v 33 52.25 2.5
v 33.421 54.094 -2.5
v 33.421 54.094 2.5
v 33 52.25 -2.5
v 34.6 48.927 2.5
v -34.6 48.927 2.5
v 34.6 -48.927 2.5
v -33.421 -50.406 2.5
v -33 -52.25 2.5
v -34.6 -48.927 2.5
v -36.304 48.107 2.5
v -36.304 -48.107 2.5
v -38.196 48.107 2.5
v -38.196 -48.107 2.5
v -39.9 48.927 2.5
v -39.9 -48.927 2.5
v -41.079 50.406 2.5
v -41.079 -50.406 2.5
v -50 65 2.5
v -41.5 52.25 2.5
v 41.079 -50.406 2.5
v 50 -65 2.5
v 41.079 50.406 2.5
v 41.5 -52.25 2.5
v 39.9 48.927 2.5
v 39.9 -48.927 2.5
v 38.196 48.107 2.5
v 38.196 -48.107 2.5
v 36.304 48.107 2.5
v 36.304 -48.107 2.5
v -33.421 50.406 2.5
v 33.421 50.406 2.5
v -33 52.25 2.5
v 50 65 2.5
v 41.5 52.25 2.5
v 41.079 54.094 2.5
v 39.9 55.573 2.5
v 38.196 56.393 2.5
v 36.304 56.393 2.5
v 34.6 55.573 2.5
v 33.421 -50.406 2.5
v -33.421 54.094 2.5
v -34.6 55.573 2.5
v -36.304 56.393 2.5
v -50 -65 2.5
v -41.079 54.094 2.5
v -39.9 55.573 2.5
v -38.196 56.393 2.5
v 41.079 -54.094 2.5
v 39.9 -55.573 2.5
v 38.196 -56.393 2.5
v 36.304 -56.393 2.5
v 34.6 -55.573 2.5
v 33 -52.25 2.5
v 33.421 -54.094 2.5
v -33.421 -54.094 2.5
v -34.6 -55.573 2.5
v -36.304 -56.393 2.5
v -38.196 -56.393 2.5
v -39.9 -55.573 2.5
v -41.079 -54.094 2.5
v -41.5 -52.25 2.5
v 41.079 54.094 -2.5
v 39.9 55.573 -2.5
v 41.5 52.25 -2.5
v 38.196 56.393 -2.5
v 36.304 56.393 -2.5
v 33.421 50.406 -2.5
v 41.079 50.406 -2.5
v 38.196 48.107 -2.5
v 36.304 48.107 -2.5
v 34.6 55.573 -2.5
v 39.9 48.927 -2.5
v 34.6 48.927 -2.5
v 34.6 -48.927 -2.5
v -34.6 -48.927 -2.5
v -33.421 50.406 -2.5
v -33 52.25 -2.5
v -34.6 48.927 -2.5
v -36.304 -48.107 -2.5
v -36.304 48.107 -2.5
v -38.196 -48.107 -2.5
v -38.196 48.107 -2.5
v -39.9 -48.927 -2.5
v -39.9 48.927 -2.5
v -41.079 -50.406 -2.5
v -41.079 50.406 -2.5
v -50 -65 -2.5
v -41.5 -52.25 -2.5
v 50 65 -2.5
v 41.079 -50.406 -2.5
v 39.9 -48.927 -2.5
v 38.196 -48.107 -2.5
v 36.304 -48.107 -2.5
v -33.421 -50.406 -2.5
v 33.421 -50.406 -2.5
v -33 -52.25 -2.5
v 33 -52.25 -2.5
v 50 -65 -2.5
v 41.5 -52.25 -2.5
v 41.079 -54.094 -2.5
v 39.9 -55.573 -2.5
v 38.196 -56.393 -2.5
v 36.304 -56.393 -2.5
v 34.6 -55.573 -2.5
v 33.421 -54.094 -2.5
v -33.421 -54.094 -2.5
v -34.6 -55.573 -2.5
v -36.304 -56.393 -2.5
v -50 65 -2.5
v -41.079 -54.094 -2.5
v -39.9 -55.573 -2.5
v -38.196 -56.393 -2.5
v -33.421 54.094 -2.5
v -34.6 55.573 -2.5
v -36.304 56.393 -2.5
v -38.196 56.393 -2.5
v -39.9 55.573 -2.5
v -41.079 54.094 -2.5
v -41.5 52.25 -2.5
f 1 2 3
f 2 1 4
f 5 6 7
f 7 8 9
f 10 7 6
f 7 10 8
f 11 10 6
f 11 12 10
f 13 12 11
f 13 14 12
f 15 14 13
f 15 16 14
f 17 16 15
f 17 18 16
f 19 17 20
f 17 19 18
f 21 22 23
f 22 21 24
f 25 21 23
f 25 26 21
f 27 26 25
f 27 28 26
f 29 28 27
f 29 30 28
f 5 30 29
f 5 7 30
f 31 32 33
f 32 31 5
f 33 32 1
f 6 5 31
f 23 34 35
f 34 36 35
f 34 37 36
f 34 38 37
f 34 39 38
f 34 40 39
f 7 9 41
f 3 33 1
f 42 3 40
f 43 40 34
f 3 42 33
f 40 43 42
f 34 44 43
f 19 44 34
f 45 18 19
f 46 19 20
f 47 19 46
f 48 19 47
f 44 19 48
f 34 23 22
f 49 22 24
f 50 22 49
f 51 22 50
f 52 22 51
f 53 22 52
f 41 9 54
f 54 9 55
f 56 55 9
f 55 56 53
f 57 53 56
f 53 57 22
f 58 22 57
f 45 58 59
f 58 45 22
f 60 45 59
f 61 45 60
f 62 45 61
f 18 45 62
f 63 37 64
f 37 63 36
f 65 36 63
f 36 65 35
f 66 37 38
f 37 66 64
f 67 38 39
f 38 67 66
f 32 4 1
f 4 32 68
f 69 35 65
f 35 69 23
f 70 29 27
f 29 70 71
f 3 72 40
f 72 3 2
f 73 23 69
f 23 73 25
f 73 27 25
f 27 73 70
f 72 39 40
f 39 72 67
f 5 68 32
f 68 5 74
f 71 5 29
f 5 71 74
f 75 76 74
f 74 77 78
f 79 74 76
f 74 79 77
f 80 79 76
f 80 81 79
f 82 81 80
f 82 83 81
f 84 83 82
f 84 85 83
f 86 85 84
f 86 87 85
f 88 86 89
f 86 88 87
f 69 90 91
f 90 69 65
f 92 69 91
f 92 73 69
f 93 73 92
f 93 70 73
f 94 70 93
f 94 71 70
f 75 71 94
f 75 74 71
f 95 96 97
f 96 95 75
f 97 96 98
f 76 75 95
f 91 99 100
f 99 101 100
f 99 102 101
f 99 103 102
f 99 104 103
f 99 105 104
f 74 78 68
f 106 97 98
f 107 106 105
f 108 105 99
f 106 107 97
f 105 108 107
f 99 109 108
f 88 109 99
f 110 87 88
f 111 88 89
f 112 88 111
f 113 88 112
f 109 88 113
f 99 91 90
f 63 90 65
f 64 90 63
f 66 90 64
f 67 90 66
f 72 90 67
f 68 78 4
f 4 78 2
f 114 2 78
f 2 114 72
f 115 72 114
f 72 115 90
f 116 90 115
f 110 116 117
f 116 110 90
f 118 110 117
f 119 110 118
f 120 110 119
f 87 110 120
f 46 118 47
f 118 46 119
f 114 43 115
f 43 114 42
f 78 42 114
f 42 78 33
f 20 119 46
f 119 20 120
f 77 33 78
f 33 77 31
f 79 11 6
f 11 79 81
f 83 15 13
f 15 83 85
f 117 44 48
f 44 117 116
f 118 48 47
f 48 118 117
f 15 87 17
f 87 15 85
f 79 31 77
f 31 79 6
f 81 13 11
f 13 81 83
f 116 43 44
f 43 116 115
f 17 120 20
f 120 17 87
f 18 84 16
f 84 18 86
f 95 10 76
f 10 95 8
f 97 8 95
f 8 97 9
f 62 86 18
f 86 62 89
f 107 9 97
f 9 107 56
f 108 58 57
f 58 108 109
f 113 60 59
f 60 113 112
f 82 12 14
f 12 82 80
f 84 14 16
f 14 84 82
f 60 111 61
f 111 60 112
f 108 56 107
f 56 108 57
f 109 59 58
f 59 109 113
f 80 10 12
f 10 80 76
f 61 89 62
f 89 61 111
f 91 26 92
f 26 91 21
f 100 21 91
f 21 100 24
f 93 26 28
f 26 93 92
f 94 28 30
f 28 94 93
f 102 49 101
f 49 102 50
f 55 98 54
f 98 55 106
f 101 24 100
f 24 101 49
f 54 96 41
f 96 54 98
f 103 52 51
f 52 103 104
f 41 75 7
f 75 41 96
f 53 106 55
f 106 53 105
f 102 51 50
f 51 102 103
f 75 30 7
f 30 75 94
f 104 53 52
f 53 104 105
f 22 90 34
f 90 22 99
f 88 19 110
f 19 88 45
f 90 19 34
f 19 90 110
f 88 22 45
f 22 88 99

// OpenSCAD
// Generated by SolidPython 1.1.3 on 2023-10-16 18:04:48


difference() {
	cube(center = true, size = [100, 130.0000000000, 5]);
	union() {
		translate(v = [37.2500000000, 52.2500000000]) {
			cylinder(center = true, h = 5, r = 4.2500000000);
		}
		translate(v = [-37.2500000000, 52.2500000000]) {
			cylinder(center = true, h = 5, r = 4.2500000000);
		}
		translate(v = [-37.2500000000, -52.2500000000]) {
			cylinder(center = true, h = 5, r = 4.2500000000);
		}
		translate(v = [37.2500000000, -52.2500000000]) {
			cylinder(center = true, h = 5, r = 4.2500000000);
		}
	}
}
/***********************************************
*********      SolidPython code:      **********
************************************************
 
import solid
import numbers
import pudb
from solid.utils import *
import viewscad
import subprocess
import os
import os.path as osp
import math
import sys

chamfer_extrude=solid.import_scad("./chamfer_extrude.scad")
chamfer_extrude=chamfer_extrude.chamfer_extrude
r = viewscad.Renderer(width=800, height=800)

def debug(model,f_name,path="/home/ts/code/projects/mfd/designs/debug"):
    solid.scad_render_to_file(model,osp.join(path,f_name)+".scad")
#generate position list of wells using offset from center
wells_pos_from_center_4 = lambda offset: [[-offset,offset],
                                        [offset, offset],
                                        [-offset, -offset],
                                        [offset, -offset]]
#wells_pos_from_center_2 = lambda offset: [[0,offset],
#                                        [0, -offset]]
wells_pos_from_center_2 = lambda offset: [[offset,0],
                                        [-offset,0]]

def make_well(dims,shape=None,height=None,dxf=False):
    def circle_cylinder():
        if dxf or (height is None):
            well = solid.circle(r=dims, segments=64)
        else:
            well = solid.cylinder(r=dims, h=height, segments=64, center = True)
        return well
    if dims is None:
        sys.exit("radius needs to be a number")
    if isinstance(dims, numbers.Number):
        well =circle_cylinder()
    elif len(dims)==1:
        if isinstance(dims[1], numbers.Number):
            well =circle_cylinder()
        else:
            sys.exit("radius needs to be a number")
    elif len(dims)==2:
        well = solid.square(dims,center = True)
    elif len(dims)==3:
        well = solid.cube(dims, center = True)
    return well

def wells_top_bottom(center_gap,device_dims=None,shape=None,height=None, positions = None, dxf = False,well_shape=None):
    if well_shape == None:
        well_shape = make_well(device_dims,shape=shape,height=height,dxf=dxf)
    wells = []
    if positions is None:
        offset = radius+radius/2.0
        positions = wells_pos_from_center_2(offset)
    if dxf or (height is None):
        height = 0
    for position in positions:
        if dxf:
            wells.append(solid.translate([position[0],position[1]])(well_shape))
        else:
            wells.append(solid.translate([position[0],position[1],height/2.0])(well_shape))
    return  union()(*wells)

#place wells in four corners 
def four_corner(radius,height=None, positions = None, dxf = False):
    #if well pos not specified set
    #to equally spaced by half radius
    if positions is None:
        offset = radius+radius/2.0
        positions = wells_pos_from_center_4(offset)
    if dxf or (height is None):
        height = 0
    #make wells at positions with specified radius and height
    wells = []
    for position in positions:
        #make circle if making dxf
        if dxf:
            well_shape = solid.circle(r=radius, segments=64)
            well_shape = solid.translate([position[0],position[1]])(well_shape)
        #if stl make cylinder
        else:
            well_shape = solid.cylinder(r=radius, h=height, segments=64, center = True)
            well_shape = solid.translate([position[0],position[1],height/2.0])(well_shape)
        wells.append(well_shape)
    return  union()(*wells)

#generate channels 
def make_channels(length,width,height=0,num_chans=1,max_chans=None,spacing=None, dxf = False,
                  rotate_channels=False):
    if dxf or (height is None):
        height = 0
    #if channel gap not defined, is equal to
    if spacing is None: spacing = width
    #calculate number of channels if fitting max num within given width
    if not max_chans is None:
        import math
        num_chans = math.floor((max_chans-spacing)/(width+spacing))
    #get total width of channel section  
    total_width = (width*num_chans)+(spacing*(num_chans-1))

    #make template channel
    #if rotate_channels: width, length = length, width
    if dxf:
        channel_t = solid.square([length,width],center = True)
    else:
        channel_t = solid.cube([length,width,height], center = True)

    #if number channels is even, offset the first channel to center its gap
    if num_chans % 2 == 0: centering = -(width/2.0+spacing/2.0)
    else: centering = 0
    #move template channel up to align bottom at z = 0 
    #and offset center if necessary
    if dxf:
        channel_t = solid.translate([0,centering])(channel_t)
    else:
        channel_t = solid.translate([0,centering,height/2.0])(channel_t)

    #if rotate_channels: length,width = width,length
    #start making the channels
    channels = []
    for i in range(num_chans):
        #if i=0 there is no translation
        #if i=1, we make the first channel adjacent to second
        direction = i

        #if i>=1, we add channels alternating left and right
        if i >= 1:
            direction = -(i/2.0)
            if i % 2 == 1: direction = (-direction)+0.5
                
        #make channel at right position and add it to channel list
        translation_coords = [0,direction*(width+spacing)]
        #if rotate_channels: translation_coords = [direction*(width+spacing),0]
        if dxf:
            channel = solid.translate(translation_coords)(channel_t)
        else:
            channel = solid.translate([*translation_coords,0])(channel_t)
        channels.append(channel)
    
    #group all channels as one object
    channels = union()(*channels)
    #compute the x,y,z dimensions in order to pass as arguments 
    #for construction of other parts of device (such as the chambers)
    measurements = {'x':(length/2.0,-length/2.0),
                    'y':(total_width/2.0,-total_width/2.0)}
    if not dxf:
        measurements['z'] = (height,0)
    if rotate_channels:
        channels = solid.rotate(90)(channels)
        measurements['x'],measurements['y']=measurements['y'],measurements['x']
    return channels,measurements

def make_chambers(msrs,height=None,extra=0,len_until=None,width=None, dxf = False):
    #computes x,y,z length
    total = lambda x : abs(x[0]) + abs(x[1])
    
    #if specific height if specified
    #otherwise use same height as channels
    if dxf:
        pass
    elif not height is None:
        msrs['z'] = (height,0)
    else:
        msrs['z'] = (0,0)
        
    #make copy of measurements from channels to modify chamber dimensions 
    #and add length to chambers as specified
    chamber_dims = msrs.copy()
    #calculate length of chamber to reach specified offset
    if not len_until is None:
        chamber_len = len_until-(msrs['x'][0])
    #or add specified length to channel length (if not specified, adds 0)
    else:
        chamber_len = msrs['x'][0]+extra
    #set the chamber length based 
    chamber_dims['x'] = (chamber_len/2.0,-(chamber_len/2.0))
    #compute final dimensions of chamber
    if not width is None:
        chamber_dims['y'] = (width/2.0,-width/2.0)
    chamber_dims = [total(size) for size in chamber_dims.values()]
        
    #calculate chamber translation offset to place adjacent to channels
    chamber_trslt = msrs['x'][0]+(chamber_len/2.0)
    #compute chamber translation coordinates to align with channels
    #x = 1 moves chamber above channels
    #x = -1 moves chamber below channels
    if dxf:
        trslt = lambda x : [x*(chamber_trslt),0]
    else:
        trslt = lambda x : [x*(chamber_trslt),0,msrs['z'][0]/2.0]
    
    #function to make chamber at top or at bottom 
    if dxf:
        move = lambda x : solid.translate(trslt(x))(solid.square(chamber_dims, center = True) )
    else:
        move = lambda x : solid.translate(trslt(x))(solid.cube(chamber_dims,center = True))
    #make top and bottom chambers and return them as grouped
    top = move(1)
    bottom = move(-1)
    #chambers=solid.rotate(90)(solid.union()(top,bottom))
    chambers=(solid.union()(top,bottom))

    return chambers

#create alignment features 
def alignment_features(unit,dims,grid_size, mask_size = None, alignment = "hollow", units_from_center = (2.5,2.5), corner_len=None):
    width = grid_size[0]*dims[0]
    length = grid_size[1]*dims[1]
    if mask_size is None and corner_len is None:
        corner_len = (dims[0] + dims[1]) /2 / 8
    corner = lambda thickness_div : solid.union()( solid.square([corner_len,corner_len/thickness_div],center=False), solid.square([corner_len/thickness_div,corner_len],center=False) )
    
    def make_full(thickness_div):
        thickness = corner_len/thickness_div
        tr = solid.translate([0, 0, 0 ])(solid.rotate(180)(corner(thickness_div)))
        tr = solid.translate([thickness/2,thickness/2,0])(tr)
        bl = solid.translate([0, 0, 0 ])(solid.rotate(0)(corner(thickness_div)))
        bl = solid.translate([-thickness/2,-thickness/2,0])(bl)
        return solid.union()(tr,bl)
    
    def make_hollow(thickness_div):
        thickness = corner_len/(thickness_div/2)
        inner = make_full(thickness_div)
        outer = make_full(thickness_div/2)
        hollow = outer - inner 
        return hollow
    
    center = (width /2 , length/2)
    mask_pos = lambda x,y : (center[0] + x*(float(units_from_center[0])*dims[0]), center[1] + y*(float(units_from_center[1])*dims[1]))
    positions = []
    positions.append(mask_pos(1,0))
    positions.append(mask_pos(0,1))
    positions.append(mask_pos(-1,0))
    positions.append(mask_pos(0,-1))
    make_mask = lambda mtype : make_hollow(8) if mtype == "hollow" else make_full(8)
    masks = [ solid.translate([*position,0])(make_mask(alignment)) for position in positions]
    
    solid.scad_render_to_file(solid.union()(*masks),"./designs/open_chamber/masks.scad")
    #return unit - solid.union()(*masks)
    return solid.union()(*masks,unit)

def create_outline(thickness, array, dims, grid_size,):
    width = grid_size[0]*dims[0] + thickness *2
    length = grid_size[1]*dims[1] + thickness *2
    outer = solid.translate([-thickness, -thickness,0])(solid.square([width, length]))
    return outer-array

def create_wall(wall_thickness, outline_thickness, dims, grid_size, wall_height = 2000, dxf = False):
    inner_width = grid_size[0]*dims[0] + outline_thickness *2
    inner_length = grid_size[1]*dims[1] + outline_thickness *2
    outer_width = inner_width + wall_thickness * 2
    outer_length = inner_length + wall_thickness * 2
    outer_pos_x = -outline_thickness-wall_thickness
    outer_pos_y = -outline_thickness-wall_thickness
    inner_pos_x = -outline_thickness
    inner_pos_y = -outline_thickness
    if dxf:
        inner_wall = solid.translate([inner_pos_x,
                                      inner_pos_y,
                                      0])(solid.square([inner_width, inner_length]))
        outer_wall = solid.translate([outer_pos_x,
                                      outer_pos_y,
                                      0])(solid.square([outer_width, outer_length]))

        return outer_wall-inner_wall
    else:
        inner_wall = solid.translate([inner_pos_x,
                                      inner_pos_y,
                                      0])(solid.cube([inner_width, inner_length,wall_height]))
        outer_wall = solid.translate([outer_pos_x,
                                      outer_pos_y,
                                      0])(solid.cube([outer_width, outer_length,wall_height]))

        return outer_wall-inner_wall, {'wall_height': wall_height,
                                       'wall_thickness': wall_thickness,
                                       'inner_width':inner_width,
                                       'inner_length': inner_length,
                                       'outer_width': outer_width,
                                       'outer_length': outer_length,
                                       'outer_pos_x' : outer_pos_x,
                                       'outer_pos_y' : outer_pos_y,
                                       'inner_pos_x' : inner_pos_x,
                                       'inner_pos_y' : inner_pos_y}

def create_thicker_wall(wall_thickness, outer_wall_offset, wall_dims, dims, grid_size, height_start = .2, height_end=2, dxf = False):
    addon_wall,thicker_wall_dims = create_wall(wall_thickness, outer_wall_offset, dims, grid_size, wall_height=height_end-height_start, dxf = False)
    addon_wall = solid.translate([0,0,height_start])(addon_wall)

    thicker_wall_dims['wall_height'] = height_end
    thicker_wall_dims['wall_thickness'] = wall_dims['wall_thickness'] + wall_thickness
    return addon_wall, thicker_wall_dims
 
def add_lock_to_wall(wall,wall_dims,y_offset = 0,cut_ratio=0.7,L_length=3, gap_ratio=0.05, axis="x",width_ratio=1/2):
    # Makes L shape
    def make_L(max_length,length_thickness,max_width,width_thickness,height,y_offset):
        length = solid.cube([max_length,length_thickness,height])
        width = solid.cube([width_thickness,max_width,height])
        width = solid.translate([max_length-(width_thickness),0,0])(width)
        L = solid.union()(width,length)
        debug(L,"L")
        if axis == "x":
            L = solid.rotate(-90)(L)
            L = solid.translate([0,max_length,0])(L)
        else:
            L = solid.rotate(-180)(L)
            L = solid.translate([max_length,max_width,0])(L)
        return solid.translate([0,0,y_offset])(L)
    
    lock_length = L_length
    lock_width = wall_dims['wall_thickness']*width_ratio
    lock_length_thickness = lock_width/2
    lock_width_thickness = lock_width/2
    L_lock = make_L(lock_length,lock_length_thickness,lock_width,lock_width_thickness, wall_dims['wall_height']-y_offset, y_offset)
    
    margin_space = lock_length - lock_length*(1-gap_ratio)
    key_length = lock_length-margin_space
    key_length_thickness = lock_length_thickness-(margin_space*2)
    key_width = lock_width-(margin_space*2)
    key_width_thickness = lock_width_thickness-(margin_space*2)
    L_key = make_L(key_length,key_length_thickness,key_width,key_width_thickness, wall_dims['wall_height']-y_offset, y_offset)
    L_key = solid.translate([margin_space,margin_space,0])(L_key)
    L = solid.union()(L_lock,L_key)
    debug(L,"L")
    
    #Make cube to be used as negative to split frame in a half
    #Can choose if making left or right negative, specify ratio of split
    def make_negative(right,cut_ratio):
        if axis == "x":
            if right:
                length = wall_dims['outer_length']*(1-cut_ratio)
                pos_x = wall_dims['outer_pos_x']+(wall_dims['outer_length']*cut_ratio)
            else:
                length = wall_dims['outer_length']*(cut_ratio)
                pos_x = wall_dims['outer_pos_x'] 
            negative = solid.cube([wall_dims['outer_width'],length, wall_dims['wall_height']])
            negative = solid.translate([wall_dims['outer_pos_y'],pos_x,0])(negative)
        else:
            if right:
                length = wall_dims['outer_width']*(1-cut_ratio)
                pos_x = wall_dims['outer_pos_y']+(wall_dims['outer_width']*cut_ratio)
            else:
                length = wall_dims['outer_width']*(cut_ratio)
                pos_x = wall_dims['outer_pos_y'] 
            negative = solid.cube([length,wall_dims['outer_length'], wall_dims['wall_height']])
            negative = solid.translate([pos_x,wall_dims['outer_pos_x'],0])(negative)
        return negative, pos_x, length 
                      
    #Make negatives
    negative_right, right_half_pos_x, right_half_length = make_negative(True,cut_ratio)
    negative_left, left_half_pos_x, right_half_length = make_negative(False,cut_ratio)
    #Make halves
    left_half = solid.difference()(wall,negative_right)
    right_half = solid.difference()(wall,negative_left)
    def place_L(L, L_length,L_width):
        #Place L on top wall       
        offset_to_center = (wall_dims['wall_thickness']-L_width)/2
        if axis == "x":
            y_pos_top = (wall_dims['outer_pos_y'] +
                    wall_dims['outer_width'] - 
                    L_width - offset_to_center)
            top_L = solid.translate([y_pos_top,
                                     right_half_pos_x-(L_length),
                                     0])(L)
            #Place L on bottom wall       
            y_pos_bottom = wall_dims['outer_pos_y']+offset_to_center
            bottom_L = solid.translate([y_pos_bottom,
                                        right_half_pos_x-L_length,
                                        0])(L)
        else:
            y_pos_top = (wall_dims['outer_pos_x'] +
                    wall_dims['outer_length'] -
                    (L_width+offset_to_center))
            top_L = solid.translate([right_half_pos_x-L_length,
                                     y_pos_top,
                                     0])(L)
            #Place L on bottom wall       
            y_pos_bottom = wall_dims['outer_pos_y']+offset_to_center
            bottom_L = solid.translate([right_half_pos_x-L_length,
                                        y_pos_bottom,
                                        0])(L)
        return bottom_L, top_L
    #Make complimentary L pieces through union and differences
    #Make Lock
    bottom_L_lock, top_L_lock = place_L(L_lock,L_length,lock_width)
    left_half = solid.difference()(left_half,bottom_L_lock)
    left_half = solid.difference()(left_half,top_L_lock)
    #Make Key
    bottom_L_key, top_L_key = place_L(L_key,L_length,lock_width)
    right_half = solid.union()(right_half,bottom_L_key)
    right_half = solid.union()(right_half,top_L_key)
    return left_half, right_half


#build a row x col grid of containment units
def make_unit_array(unit,dims,grid_size, dxf = False, alignment = None, mask_size = None,
                    units_from_center = None,alignment_offset=None, alignment_mark_size=1):
    units = []
    for col in range(grid_size[1]):
        for row in range(grid_size[0]):
            if dxf:
                units.append(solid.translate([row*dims[0],col*dims[1]])(unit))
            else:
                units.append(solid.translate([row*dims[0],col*dims[1],dims[2]/2.0])(unit))
    array = solid.union()(*units)
    if (not alignment is None) and dxf:
        if not alignment_offset is None:
            array = solid.translate([alignment_offset[0],alignment_offset[1]])(array)
        array = alignment_features(array,dims, grid_size, alignment = alignment, mask_size = None, units_from_center = units_from_center,corner_len=alignment_mark_size)
        if not alignment_offset is None:
            array = solid.translate([-alignment_offset[0],-alignment_offset[1]])(array)
    return array


def make_taylor(wells_pos = wells_pos_from_center_4(2.25), well_rad = 1.5 ,
                well_height = 2, chan_w = 0.01, chan_l = 1, chan_h = 0.010 ,
                chan_gap = 0.040, max_chans = None,num_chans=100, chamber_height  = 0.100,
                columns = 1, rows = 1, chamber_len_until=2.25, add_channels = True, add_wells = True, 
                add_chambers = True, save_path = "./", alignment = None, units_from_center = 2,
                mask_size = None, render_stl = False, outline_thickness = 0.050, dxf = True,
                wall_height = 15, wall_thickness = 0.95, casing_x=9, casing_y=9, casing_z=0,rotate_units=0):

    dims = [casing_x, casing_y, casing_z]
    wells = four_corner(well_rad,well_height, dxf = dxf, positions = wells_pos)
    debug(wells,"wells")
    channels, msrs = make_channels(chan_l,chan_w,chan_h,dxf=dxf, spacing = chan_gap, max_chans=max_chans,num_chans=num_chans)
    debug(channels,"channels")
    chambers = make_chambers(msrs,dxf = dxf, height=chamber_height,len_until=chamber_len_until)
    debug(chambers,"chambers")

    #add together and render
    device_parts = []
    if add_channels:
        device_parts.append(channels)
    if add_wells:
        device_parts.append(wells)
    if add_chambers:
        device_parts.append(chambers)
    device=union()(*device_parts)
    device = rotate(rotate_units)(device)

    device=solid.translate([dims[0]/2.0,dims[1]/2.0,0])(device)
    channels = rotate(rotate_units)(channels)
    channels=solid.translate([dims[0]/2,dims[1]/2,0])(channels)
    chambers_wells = union()(wells,chambers)
    chambers_wells = rotate(rotate_units)(chambers_wells)
    chambers_wells=solid.translate([dims[0]/2,dims[1]/2,0])(chambers_wells)

    file_name = str(rows)+'x'+str(columns)+'_units_'
    grid_size = [rows,columns]

    if alignment:
        alignment="full"
    device = make_unit_array(device,dims,grid_size, dxf=dxf, alignment = alignment,
                                 units_from_center = units_from_center)
    channels = make_unit_array(channels,dims,grid_size, dxf=dxf, alignment = alignment,
                                 units_from_center = units_from_center)
    if alignment=="full":
        alignment="hollow"

    chambers_wells = make_unit_array(chambers_wells,dims,grid_size, dxf=dxf, alignment = alignment,
                                 units_from_center =units_from_center)

    def save_model(model,prefix):
        model_fname = os.path.abspath(save_path+prefix+"_"+file_name+".scad")
        solid.scad_render_to_file(model,model_fname)
        return model_fname

    wells_fname = save_model(wells,"wells")
    channels_fname = save_model(channels,"channels")
    device_fname = save_model(device,"device")
    chambers_wells_fname = save_model(chambers_wells,"chambers_wells")
    return (chambers_wells,chambers_wells_fname), (channels,channels_fname), (device,device_fname)

def make_device(design='open',rows=8,columns=6,wells_pos = 4.5,well_offset=3.2, well_rad=3.2,well_height=0.1,
                chan_l=1,chan_w=0.01,chan_h=0.01,chan_gap=0.015,num_chans=101,dxf=True,save_path="./designs/open_chamber/",
                casing_x=9.0,casing_y=18.0,casing_z=0,rotate_units=90,units_from_center=(3,1),chamber_len_until=4.5,
                chamber_width=None,alignment=True, add_wells=True, add_channels=True,add_chambers=True,well_shape=None):

    dims = [casing_x, casing_y, casing_z]
    if design == "open":
        wells_pos=wells_pos_from_center_2(wells_pos)
        wells = wells_top_bottom(well_offset*2,device_dims=well_rad,height=well_height, dxf = dxf, positions = wells_pos,well_shape=well_shape)
    elif design == "closed":
        wells_pos=wells_pos_from_center_4(wells_pos)
        debug(wells,"wells")
        wells = four_corner(well_offset,well_height,device_dims=well_rad, dxf = dxf, positions = wells_pos)
    else:
        print(design+" is not a valid design.\n Choose valid design: 'open' or 'closed'")
        exit()
    wells = rotate(rotate_units)(wells)
    wells=solid.translate([dims[0]/2,dims[1]/2,0])(wells)
    debug(wells,"wells")

    channels, msrs = make_channels(chan_l,chan_w,chan_h,dxf=dxf, spacing = chan_gap, num_chans=num_chans,rotate_channels=False)
    channels = rotate(rotate_units)(channels)
    channels=solid.translate([dims[0]/2,dims[1]/2,0])(channels)

    chambers=make_chambers(msrs,height=None,extra=0,len_until=chamber_len_until, width=chamber_width,dxf = dxf)
    chambers = rotate(rotate_units)(chambers)
    chambers=solid.translate([dims[0]/2,dims[1]/2,0])(chambers)

    device_parts = []
    if add_channels:
        device_parts.append(channels)
    if add_wells:
        device_parts.append(wells)
    if add_chambers:
        device_parts.append(chambers)
    device = union()(*device_parts)
    #device = rotate(rotate_units)(device)
    #device=solid.translate([dims[0]/2.0,dims[1]/2.0,0])(device)

    chambers_wells = []
    if add_chambers:
        chambers_wells.append(chambers)
    if add_wells:
        chambers_wells.append(wells)
    chambers_wells = union()(*chambers_wells)
    #chambers_wells = union()(wells,chambers)
    #chambers_wells = rotate(rotate_units)(chambers_wells)
    #chambers_wells=solid.translate([dims[0]/2,dims[1]/2,0])(chambers_wells)

    file_name = str(rows)+'x'+str(columns)+'_units_'

    grid_size = [rows,columns]
    if alignment:
        alignment="full"
    device = make_unit_array(device,dims,grid_size, dxf=dxf, alignment = alignment,
                                 units_from_center = units_from_center)
    channels = make_unit_array(channels,dims,grid_size, dxf=dxf, alignment = alignment,
                                 units_from_center = units_from_center)
    if alignment=="full":
        alignment="hollow"

    chambers_wells = make_unit_array(chambers_wells,dims,grid_size, dxf=dxf, alignment = alignment,
                                 units_from_center =units_from_center)

    def save_model(model,prefix):
        model_fname = os.path.abspath(save_path+prefix+"_"+file_name+".scad")
        solid.scad_render_to_file(model,model_fname)
        return model_fname

    wells_fname = save_model(wells,"wells")
    channels_fname = save_model(channels,"channels")
    device_fname = save_model(device,"device")
    chambers_wells_fname = save_model(chambers_wells,"chambers_wells")
    return (chambers_wells,chambers_wells_fname), (channels,channels_fname), (device,device_fname)


def make_open_chamber(rows=8,columns=6,wells_pos = wells_pos_from_center_2(4.5), well_rad=3.2,well_height=0.1,
                      chan_l=1,chan_w=0.01,chan_h=0.01,chan_gap=0.015,num_chans=101,dxf=True,save_path="./designs/open_chamber/",
                      casing_x=9.0,casing_y=18.0,casing_z=0,rotate_units=90,units_from_center=(3,1),chamber_len_until=4.5,
                      chamber_width=None,alignment=True, add_wells=True, add_channels=True,add_chambers=True,well_shape=None):

    dims = [casing_x, casing_y, casing_z]
    wells = wells_top_bottom(well_rad,height=well_height, dxf = dxf, positions = wells_pos, well_shape=well_shape)
    channels, msrs = make_channels(chan_l,chan_w,chan_h,dxf=dxf, spacing = chan_gap, num_chans=num_chans,rotate_channels=False)
    chambers=make_chambers(msrs,height=None,extra=0,len_until=chamber_len_until, width=chamber_width,dxf = dxf)
    debug(chambers,"chambers")
    device_parts = []
    if add_channels:
        device_parts.append(channels)
    if add_wells:
        device_parts.append(wells)
    if add_chambers:
        device_parts.append(chambers)
    device = union()(*device_parts)
    device = rotate(rotate_units)(device)
    device=solid.translate([dims[0]/2.0,dims[1]/2.0,0])(device)
    channels = rotate(rotate_units)(channels)
    channels=solid.translate([dims[0]/2,dims[1]/2,0])(channels)
    chambers_wells = union()(wells,chambers)
    chambers_wells = rotate(rotate_units)(chambers_wells)
    chambers_wells=solid.translate([dims[0]/2,dims[1]/2,0])(chambers_wells)

    file_name = str(rows)+'x'+str(columns)+'_units_'

    grid_size = [rows,columns]
    if alignment:
        alignment="full"
    device = make_unit_array(device,dims,grid_size, dxf=dxf, alignment = alignment,
                                 units_from_center = units_from_center)
    channels = make_unit_array(channels,dims,grid_size, dxf=dxf, alignment = alignment,
                                 units_from_center = units_from_center)
    if alignment=="full":
        alignment="hollow"

    chambers_wells = make_unit_array(chambers_wells,dims,grid_size, dxf=dxf, alignment = alignment,
                                 units_from_center =units_from_center)

    def save_model(model,prefix):
        model_fname = os.path.abspath(save_path+prefix+"_"+file_name+".scad")
        solid.scad_render_to_file(model,model_fname)
        return model_fname

    wells_fname = save_model(wells,"wells")
    channels_fname = save_model(channels,"channels")
    device_fname = save_model(device,"device")
    chambers_wells_fname = save_model(chambers_wells,"chambers_wells")
    return (chambers_wells,chambers_wells_fname), (channels,channels_fname), (device,device_fname)

def to_dxf(scad_path):
    dxf_path = scad_path.replace(".scad",".dxf")
    subprocess.call(["openscad", "-o", dxf_path, scad_path])
    import ezdxf
    temp_dxf = ezdxf.readfile(dxf_path)
    temp_dxf.saveas(dxf_path)

#def make_walls(diameter,thickness,grid_size,dims,height=20,segments=256,make_inner=True):
#    wafer_wall_out = solid.cylinder(r=diameter/2,h=height, segments=segments)
#    wafer_wall_in = solid.cylinder(r=(diameter/2-thickness),h=height, segments=segments)
#    wafer_wall = solid.difference()(wafer_wall_out,wafer_wall_in)
#    wafer_wall = solid.translate([grid_size[1]*dims[1]/2.0,grid_size[0]*dims[0]/2.0])(wafer_wall)
#
#    vertical_wall_length = grid_size[1]*dims[1]
#    horizontal_wall_length = grid_size[0]*dims[0]
#    vertical_wall = solid.cube([vertical_wall_length,thickness,height],center = True)
#    vertical_wall = solid.translate([vertical_wall_length/2,0,height/2])(vertical_wall)
#    horizontal_wall = solid.cube([thickness,horizontal_wall_length,height],center = True)
#    horizontal_wall = solid.translate([0,vertical_wall_length/2,height/2])(horizontal_wall)
#    walls = []
#    walls.append(horizontal_wall)
#    walls.append(vertical_wall)
#    for col in range(grid_size[1]):
#        if col == grid_size[1]-1: 
#            walls.append(solid.translate([0,(col+1)*dims[1]])(vertical_wall))
#        elif col > 0 and col < grid_size[1]-1 and make_inner==True:
#            walls.append(solid.translate([0,(col+1)*dims[1]])(vertical_wall))
#    for row in range(grid_size[0]):
#        if row == grid_size[0]-1: 
#            walls.append(solid.translate([(row+1)*dims[0],0])(horizontal_wall))
#        elif row > 0 and row < grid_size[0]-1 and make_inner==True:
#            walls.append(solid.translate([(row+1)*dims[0],0])(horizontal_wall))
#    walls = union()(*walls)
#    wafer_walls = union()(walls,wafer_wall)
#    return walls,wafer_wall,wafer_walls

def make_walls(diameter,thickness,grid_size,dims,height=20,segments=256,make_inner=True,padx=0,pady=0):
    wafer_wall_out = solid.cylinder(r=diameter/2,h=height, segments=segments)
    wafer_wall_in = solid.cylinder(r=(diameter/2-thickness),h=height, segments=segments)
    wafer_wall = solid.difference()(wafer_wall_out,wafer_wall_in)
    wafer_wall = solid.translate([grid_size[1]*dims[1]/2.0,grid_size[0]*dims[0]/2.0])(wafer_wall)

    vertical_wall_length = grid_size[0]*dims[0]+padx
    horizontal_wall_length = grid_size[1]*dims[1]+pady
    vertical_wall = solid.cube([vertical_wall_length,thickness,height],center = True)
    vertical_wall = solid.translate([vertical_wall_length/2-pady/2,-padx/2,height/2])(vertical_wall)
    horizontal_wall = solid.cube([thickness,horizontal_wall_length,height],center = True)
    horizontal_wall = solid.translate([-pady/2,horizontal_wall_length/2-padx/2,height/2])(horizontal_wall)
    walls = []
    walls.append(horizontal_wall)
    walls.append(vertical_wall)
    for col in range(grid_size[1]):
        if col == grid_size[1]-1: 
            walls.append(solid.translate([0,(col+1)*dims[1]+pady])(vertical_wall))
        elif col > 0 and col < grid_size[1]-1 and make_inner==True:
            walls.append(solid.translate([0,(col+1)*dims[1]])(vertical_wall))
    for row in range(grid_size[0]):
        if row == grid_size[0]-1: 
            walls.append(solid.translate([(row+1)*dims[0]+padx,0])(horizontal_wall))
        elif row > 0 and row < grid_size[0]-1 and make_inner==True:
            walls.append(solid.translate([(row+1)*dims[0],0])(horizontal_wall))
    walls = union()(*walls)
    wafer_walls = union()(walls,wafer_wall)
    return walls,wafer_wall,wafer_walls

def save_model(model,base_path,base_name,dxf=True):
    if not os.path.exists(base_path):
        os.makedirs(base_path)
    dxf_path=osp.join(base_path,base_name+".scad")
    solid.scad_render_to_file(model,osp.join(dxf_path))
    if dxf:
        to_dxf(dxf_path)

def make_wafer(diameter,flat_len,thickness):
    wafer = solid.cylinder(r1=diameter/2,r2=diameter/2,h=thickness,segments=512,)()
    x_start_flat=(flat_len/2)
    y_start_flat = math.sqrt(((diameter/2)**2) - (x_start_flat**2) )
    height_delete_flat=diameter/2-y_start_flat
    flat_delete = solid.cube([flat_len,height_delete_flat,thickness],center=False)()
    flat_delete = solid.translate([-flat_len/2,y_start_flat,0])(flat_delete)
    wafer = solid.difference()(wafer,flat_delete)
    wafer = solid.rotate(90)(wafer)
    return wafer

def add_wafer_to_mask(wafer_size,flat_len,mask,grid_size,dims,wafer_line_thickness=0.1,outer_mask_thickness=5,alignment_offset=None):
    def make_wafer_mask(wafer_size,flat_len):
        wafer_mask = make_wafer(wafer_size,flat_len,1)
        wafer_mask = solid.projection()(wafer_mask)
        wafer_mask = solid.translate([grid_size[0]*dims[0]/2.0,grid_size[1]*dims[1]/2.0])(wafer_mask)
        if not alignment_offset is None:
            wafer_mask = solid.translate([-alignment_offset[0],-alignment_offset[1]])(wafer_mask)
        return wafer_mask

    inner_wafer_line_mask = make_wafer_mask(wafer_size-wafer_line_thickness/2,flat_len)
    outer_wafer_line_mask = make_wafer_mask(wafer_size+wafer_line_thickness/2,flat_len)
    outer_wafer_mask = make_wafer_mask(wafer_size+outer_mask_thickness,flat_len)
    outer_wafer_mask = solid.difference()(outer_wafer_mask,outer_wafer_line_mask)
    wafer_mask = solid.union()(outer_wafer_mask,inner_wafer_line_mask)

    return solid.difference()(wafer_mask,mask)

def make_posts(post_shape,post_height):
    posts = solid.linear_extrude(height=post_height)(post_shape)
    return posts

def make_wafer_empty(diameter,flat_len,thickness,margin,notch_len=20,notch_height=5,oversize=1.01):
    diameter*=oversize
    flat_len*=oversize
    wafer = make_wafer(diameter,flat_len,thickness)
    holder = solid.cylinder(r1=diameter/2+margin,r2=diameter/2+margin,h=thickness,segments=512)()
    holder = solid.difference()(holder,wafer)

    x_start_flat=(flat_len/2)
    y_start_flat = math.sqrt(((diameter/2)**2) - (x_start_flat**2) )
    height_delete_flat=diameter/2-y_start_flat
    notch = solid.cube([notch_len,notch_height,thickness],center=False)()
    notch = solid.translate([-notch_len/2,y_start_flat,0])(notch)
    notch = solid.rotate(90)(notch)
    return solid.difference()(holder,notch)

def wafer_print_calibration(diameter,thickness,height,z_offset):
    circles = []
    radii = []
    radii.append(diameter/2.0*0.8)
    radii.append(diameter/2.0*0.6)
    radii.append(diameter/2.0*0.4)
    radii.append(diameter/2.0*0.2)
    for radius in radii:
        inner = solid.cylinder(r1=radius-(thickness/2.0),r2=radius-(thickness/2.0),h=thickness,segments=512,)()
        outer = solid.cylinder(r1=radius+(thickness/2.0),r2=radius+(thickness/2.0),h=thickness,segments=512,)()
        diff = solid.difference()(outer,inner)
        circles.append(diff)
    circles = solid.union()(*circles)
    circles = solid.translate([0,0,z_offset])(circles)
    return circles

def make_rack(wells,dims,grid_size,alignment_offset,rack_x,rack_y,rack_thickness,bolt_width,add_bolts=True):

    #get X and Y dimensions of gride of pipette tips
    X_len = dims[0]*grid_size[0]
    Y_len = dims[1]*grid_size[1]
    #make rack
    rack = solid.cube([rack_x,rack_y,rack_thickness],center=True)

    if add_bolts:
    #add bolt holes
        bolt_hole=solid.cylinder(r=bolt_width/2,h=rack_thickness,center=True)()
        bolt_holes = []
        bolt_holes.append(solid.translate([rack_x/2-1.5*bolt_width,rack_y/2-1.5*bolt_width])(bolt_hole))
        bolt_holes.append(solid.translate([-rack_x/2+1.5*bolt_width,rack_y/2-1.5*bolt_width])(bolt_hole))
        bolt_holes.append(solid.translate([-rack_x/2+1.5*bolt_width,-rack_y/2+1.5*bolt_width])(bolt_hole))
        bolt_holes.append(solid.translate([rack_x/2-1.5*bolt_width,-rack_y/2+1.5*bolt_width])(bolt_hole))
        bolt_holes = solid.union()(*bolt_holes)
        rack=solid.difference()(rack,bolt_holes)
    rack_support = rack

    #center rack with pipette holes
    rack = solid.translate([0,0,rack_thickness/2])(rack)
    rack = solid.translate([X_len/2,Y_len/2])(rack)
    rack = solid.translate([-alignment_offset[0],-alignment_offset[1]])(rack)
    wells = solid.linear_extrude(height=rack_thickness)(wells)
    rack = solid.difference()(rack,wells)
    return rack, rack_support

def make_pillar(wells,dims,grid_size,alignment_offset,rack_x,rack_y,pillar_height,rack_thickness,bolt_width,add_bolts=True,taper_angle=1,bolt_position_corner=1.5):

    #get X and Y dimensions of gride of pipette tips
    X_len = dims[0]*grid_size[0]
    Y_len = dims[1]*grid_size[1]
    #make rack
    rack = solid.cube([rack_x,rack_y,rack_thickness],center=True)
    
    if add_bolts:
    #add bolt holes
        bolt_hole=solid.cylinder(r=bolt_width/2,h=rack_thickness,center=True)()
        bolt_holes = []
        bolt_holes.append(solid.translate([rack_x/2-bolt_position_corner*bolt_width,rack_y/2-bolt_position_corner*bolt_width])(bolt_hole))
        bolt_holes.append(solid.translate([-rack_x/2+bolt_position_corner*bolt_width,rack_y/2-bolt_position_corner*bolt_width])(bolt_hole))
        bolt_holes.append(solid.translate([-rack_x/2+bolt_position_corner*bolt_width,-rack_y/2+bolt_position_corner*bolt_width])(bolt_hole))
        bolt_holes.append(solid.translate([rack_x/2-bolt_position_corner*bolt_width,-rack_y/2+bolt_position_corner*bolt_width])(bolt_hole))
        bolt_holes = solid.union()(*bolt_holes)
        rack=solid.difference()(rack,bolt_holes)
    rack_support = rack

    #center rack with pipette holes
    #rack = solid.translate([0,0,-rack_thickness])(rack)
    rack = solid.translate([X_len/2,Y_len/2])(rack)
    rack = solid.translate([-alignment_offset[0],-alignment_offset[1]])(rack)
    if not taper_angle == 0:
        wells=chamfer_extrude(pillar_height,taper_angle,segments=20)(wells)
    else:
        wells = solid.linear_extrude(height=pillar_height)(wells)
    rack = solid.union()(rack,wells)
    return rack, rack_support

def deg_taper_len(height,deg):
    if not deg == 0:
        return height*math.tan(math.radians(deg))
    else:
        return 0









 
 
************************************************/
